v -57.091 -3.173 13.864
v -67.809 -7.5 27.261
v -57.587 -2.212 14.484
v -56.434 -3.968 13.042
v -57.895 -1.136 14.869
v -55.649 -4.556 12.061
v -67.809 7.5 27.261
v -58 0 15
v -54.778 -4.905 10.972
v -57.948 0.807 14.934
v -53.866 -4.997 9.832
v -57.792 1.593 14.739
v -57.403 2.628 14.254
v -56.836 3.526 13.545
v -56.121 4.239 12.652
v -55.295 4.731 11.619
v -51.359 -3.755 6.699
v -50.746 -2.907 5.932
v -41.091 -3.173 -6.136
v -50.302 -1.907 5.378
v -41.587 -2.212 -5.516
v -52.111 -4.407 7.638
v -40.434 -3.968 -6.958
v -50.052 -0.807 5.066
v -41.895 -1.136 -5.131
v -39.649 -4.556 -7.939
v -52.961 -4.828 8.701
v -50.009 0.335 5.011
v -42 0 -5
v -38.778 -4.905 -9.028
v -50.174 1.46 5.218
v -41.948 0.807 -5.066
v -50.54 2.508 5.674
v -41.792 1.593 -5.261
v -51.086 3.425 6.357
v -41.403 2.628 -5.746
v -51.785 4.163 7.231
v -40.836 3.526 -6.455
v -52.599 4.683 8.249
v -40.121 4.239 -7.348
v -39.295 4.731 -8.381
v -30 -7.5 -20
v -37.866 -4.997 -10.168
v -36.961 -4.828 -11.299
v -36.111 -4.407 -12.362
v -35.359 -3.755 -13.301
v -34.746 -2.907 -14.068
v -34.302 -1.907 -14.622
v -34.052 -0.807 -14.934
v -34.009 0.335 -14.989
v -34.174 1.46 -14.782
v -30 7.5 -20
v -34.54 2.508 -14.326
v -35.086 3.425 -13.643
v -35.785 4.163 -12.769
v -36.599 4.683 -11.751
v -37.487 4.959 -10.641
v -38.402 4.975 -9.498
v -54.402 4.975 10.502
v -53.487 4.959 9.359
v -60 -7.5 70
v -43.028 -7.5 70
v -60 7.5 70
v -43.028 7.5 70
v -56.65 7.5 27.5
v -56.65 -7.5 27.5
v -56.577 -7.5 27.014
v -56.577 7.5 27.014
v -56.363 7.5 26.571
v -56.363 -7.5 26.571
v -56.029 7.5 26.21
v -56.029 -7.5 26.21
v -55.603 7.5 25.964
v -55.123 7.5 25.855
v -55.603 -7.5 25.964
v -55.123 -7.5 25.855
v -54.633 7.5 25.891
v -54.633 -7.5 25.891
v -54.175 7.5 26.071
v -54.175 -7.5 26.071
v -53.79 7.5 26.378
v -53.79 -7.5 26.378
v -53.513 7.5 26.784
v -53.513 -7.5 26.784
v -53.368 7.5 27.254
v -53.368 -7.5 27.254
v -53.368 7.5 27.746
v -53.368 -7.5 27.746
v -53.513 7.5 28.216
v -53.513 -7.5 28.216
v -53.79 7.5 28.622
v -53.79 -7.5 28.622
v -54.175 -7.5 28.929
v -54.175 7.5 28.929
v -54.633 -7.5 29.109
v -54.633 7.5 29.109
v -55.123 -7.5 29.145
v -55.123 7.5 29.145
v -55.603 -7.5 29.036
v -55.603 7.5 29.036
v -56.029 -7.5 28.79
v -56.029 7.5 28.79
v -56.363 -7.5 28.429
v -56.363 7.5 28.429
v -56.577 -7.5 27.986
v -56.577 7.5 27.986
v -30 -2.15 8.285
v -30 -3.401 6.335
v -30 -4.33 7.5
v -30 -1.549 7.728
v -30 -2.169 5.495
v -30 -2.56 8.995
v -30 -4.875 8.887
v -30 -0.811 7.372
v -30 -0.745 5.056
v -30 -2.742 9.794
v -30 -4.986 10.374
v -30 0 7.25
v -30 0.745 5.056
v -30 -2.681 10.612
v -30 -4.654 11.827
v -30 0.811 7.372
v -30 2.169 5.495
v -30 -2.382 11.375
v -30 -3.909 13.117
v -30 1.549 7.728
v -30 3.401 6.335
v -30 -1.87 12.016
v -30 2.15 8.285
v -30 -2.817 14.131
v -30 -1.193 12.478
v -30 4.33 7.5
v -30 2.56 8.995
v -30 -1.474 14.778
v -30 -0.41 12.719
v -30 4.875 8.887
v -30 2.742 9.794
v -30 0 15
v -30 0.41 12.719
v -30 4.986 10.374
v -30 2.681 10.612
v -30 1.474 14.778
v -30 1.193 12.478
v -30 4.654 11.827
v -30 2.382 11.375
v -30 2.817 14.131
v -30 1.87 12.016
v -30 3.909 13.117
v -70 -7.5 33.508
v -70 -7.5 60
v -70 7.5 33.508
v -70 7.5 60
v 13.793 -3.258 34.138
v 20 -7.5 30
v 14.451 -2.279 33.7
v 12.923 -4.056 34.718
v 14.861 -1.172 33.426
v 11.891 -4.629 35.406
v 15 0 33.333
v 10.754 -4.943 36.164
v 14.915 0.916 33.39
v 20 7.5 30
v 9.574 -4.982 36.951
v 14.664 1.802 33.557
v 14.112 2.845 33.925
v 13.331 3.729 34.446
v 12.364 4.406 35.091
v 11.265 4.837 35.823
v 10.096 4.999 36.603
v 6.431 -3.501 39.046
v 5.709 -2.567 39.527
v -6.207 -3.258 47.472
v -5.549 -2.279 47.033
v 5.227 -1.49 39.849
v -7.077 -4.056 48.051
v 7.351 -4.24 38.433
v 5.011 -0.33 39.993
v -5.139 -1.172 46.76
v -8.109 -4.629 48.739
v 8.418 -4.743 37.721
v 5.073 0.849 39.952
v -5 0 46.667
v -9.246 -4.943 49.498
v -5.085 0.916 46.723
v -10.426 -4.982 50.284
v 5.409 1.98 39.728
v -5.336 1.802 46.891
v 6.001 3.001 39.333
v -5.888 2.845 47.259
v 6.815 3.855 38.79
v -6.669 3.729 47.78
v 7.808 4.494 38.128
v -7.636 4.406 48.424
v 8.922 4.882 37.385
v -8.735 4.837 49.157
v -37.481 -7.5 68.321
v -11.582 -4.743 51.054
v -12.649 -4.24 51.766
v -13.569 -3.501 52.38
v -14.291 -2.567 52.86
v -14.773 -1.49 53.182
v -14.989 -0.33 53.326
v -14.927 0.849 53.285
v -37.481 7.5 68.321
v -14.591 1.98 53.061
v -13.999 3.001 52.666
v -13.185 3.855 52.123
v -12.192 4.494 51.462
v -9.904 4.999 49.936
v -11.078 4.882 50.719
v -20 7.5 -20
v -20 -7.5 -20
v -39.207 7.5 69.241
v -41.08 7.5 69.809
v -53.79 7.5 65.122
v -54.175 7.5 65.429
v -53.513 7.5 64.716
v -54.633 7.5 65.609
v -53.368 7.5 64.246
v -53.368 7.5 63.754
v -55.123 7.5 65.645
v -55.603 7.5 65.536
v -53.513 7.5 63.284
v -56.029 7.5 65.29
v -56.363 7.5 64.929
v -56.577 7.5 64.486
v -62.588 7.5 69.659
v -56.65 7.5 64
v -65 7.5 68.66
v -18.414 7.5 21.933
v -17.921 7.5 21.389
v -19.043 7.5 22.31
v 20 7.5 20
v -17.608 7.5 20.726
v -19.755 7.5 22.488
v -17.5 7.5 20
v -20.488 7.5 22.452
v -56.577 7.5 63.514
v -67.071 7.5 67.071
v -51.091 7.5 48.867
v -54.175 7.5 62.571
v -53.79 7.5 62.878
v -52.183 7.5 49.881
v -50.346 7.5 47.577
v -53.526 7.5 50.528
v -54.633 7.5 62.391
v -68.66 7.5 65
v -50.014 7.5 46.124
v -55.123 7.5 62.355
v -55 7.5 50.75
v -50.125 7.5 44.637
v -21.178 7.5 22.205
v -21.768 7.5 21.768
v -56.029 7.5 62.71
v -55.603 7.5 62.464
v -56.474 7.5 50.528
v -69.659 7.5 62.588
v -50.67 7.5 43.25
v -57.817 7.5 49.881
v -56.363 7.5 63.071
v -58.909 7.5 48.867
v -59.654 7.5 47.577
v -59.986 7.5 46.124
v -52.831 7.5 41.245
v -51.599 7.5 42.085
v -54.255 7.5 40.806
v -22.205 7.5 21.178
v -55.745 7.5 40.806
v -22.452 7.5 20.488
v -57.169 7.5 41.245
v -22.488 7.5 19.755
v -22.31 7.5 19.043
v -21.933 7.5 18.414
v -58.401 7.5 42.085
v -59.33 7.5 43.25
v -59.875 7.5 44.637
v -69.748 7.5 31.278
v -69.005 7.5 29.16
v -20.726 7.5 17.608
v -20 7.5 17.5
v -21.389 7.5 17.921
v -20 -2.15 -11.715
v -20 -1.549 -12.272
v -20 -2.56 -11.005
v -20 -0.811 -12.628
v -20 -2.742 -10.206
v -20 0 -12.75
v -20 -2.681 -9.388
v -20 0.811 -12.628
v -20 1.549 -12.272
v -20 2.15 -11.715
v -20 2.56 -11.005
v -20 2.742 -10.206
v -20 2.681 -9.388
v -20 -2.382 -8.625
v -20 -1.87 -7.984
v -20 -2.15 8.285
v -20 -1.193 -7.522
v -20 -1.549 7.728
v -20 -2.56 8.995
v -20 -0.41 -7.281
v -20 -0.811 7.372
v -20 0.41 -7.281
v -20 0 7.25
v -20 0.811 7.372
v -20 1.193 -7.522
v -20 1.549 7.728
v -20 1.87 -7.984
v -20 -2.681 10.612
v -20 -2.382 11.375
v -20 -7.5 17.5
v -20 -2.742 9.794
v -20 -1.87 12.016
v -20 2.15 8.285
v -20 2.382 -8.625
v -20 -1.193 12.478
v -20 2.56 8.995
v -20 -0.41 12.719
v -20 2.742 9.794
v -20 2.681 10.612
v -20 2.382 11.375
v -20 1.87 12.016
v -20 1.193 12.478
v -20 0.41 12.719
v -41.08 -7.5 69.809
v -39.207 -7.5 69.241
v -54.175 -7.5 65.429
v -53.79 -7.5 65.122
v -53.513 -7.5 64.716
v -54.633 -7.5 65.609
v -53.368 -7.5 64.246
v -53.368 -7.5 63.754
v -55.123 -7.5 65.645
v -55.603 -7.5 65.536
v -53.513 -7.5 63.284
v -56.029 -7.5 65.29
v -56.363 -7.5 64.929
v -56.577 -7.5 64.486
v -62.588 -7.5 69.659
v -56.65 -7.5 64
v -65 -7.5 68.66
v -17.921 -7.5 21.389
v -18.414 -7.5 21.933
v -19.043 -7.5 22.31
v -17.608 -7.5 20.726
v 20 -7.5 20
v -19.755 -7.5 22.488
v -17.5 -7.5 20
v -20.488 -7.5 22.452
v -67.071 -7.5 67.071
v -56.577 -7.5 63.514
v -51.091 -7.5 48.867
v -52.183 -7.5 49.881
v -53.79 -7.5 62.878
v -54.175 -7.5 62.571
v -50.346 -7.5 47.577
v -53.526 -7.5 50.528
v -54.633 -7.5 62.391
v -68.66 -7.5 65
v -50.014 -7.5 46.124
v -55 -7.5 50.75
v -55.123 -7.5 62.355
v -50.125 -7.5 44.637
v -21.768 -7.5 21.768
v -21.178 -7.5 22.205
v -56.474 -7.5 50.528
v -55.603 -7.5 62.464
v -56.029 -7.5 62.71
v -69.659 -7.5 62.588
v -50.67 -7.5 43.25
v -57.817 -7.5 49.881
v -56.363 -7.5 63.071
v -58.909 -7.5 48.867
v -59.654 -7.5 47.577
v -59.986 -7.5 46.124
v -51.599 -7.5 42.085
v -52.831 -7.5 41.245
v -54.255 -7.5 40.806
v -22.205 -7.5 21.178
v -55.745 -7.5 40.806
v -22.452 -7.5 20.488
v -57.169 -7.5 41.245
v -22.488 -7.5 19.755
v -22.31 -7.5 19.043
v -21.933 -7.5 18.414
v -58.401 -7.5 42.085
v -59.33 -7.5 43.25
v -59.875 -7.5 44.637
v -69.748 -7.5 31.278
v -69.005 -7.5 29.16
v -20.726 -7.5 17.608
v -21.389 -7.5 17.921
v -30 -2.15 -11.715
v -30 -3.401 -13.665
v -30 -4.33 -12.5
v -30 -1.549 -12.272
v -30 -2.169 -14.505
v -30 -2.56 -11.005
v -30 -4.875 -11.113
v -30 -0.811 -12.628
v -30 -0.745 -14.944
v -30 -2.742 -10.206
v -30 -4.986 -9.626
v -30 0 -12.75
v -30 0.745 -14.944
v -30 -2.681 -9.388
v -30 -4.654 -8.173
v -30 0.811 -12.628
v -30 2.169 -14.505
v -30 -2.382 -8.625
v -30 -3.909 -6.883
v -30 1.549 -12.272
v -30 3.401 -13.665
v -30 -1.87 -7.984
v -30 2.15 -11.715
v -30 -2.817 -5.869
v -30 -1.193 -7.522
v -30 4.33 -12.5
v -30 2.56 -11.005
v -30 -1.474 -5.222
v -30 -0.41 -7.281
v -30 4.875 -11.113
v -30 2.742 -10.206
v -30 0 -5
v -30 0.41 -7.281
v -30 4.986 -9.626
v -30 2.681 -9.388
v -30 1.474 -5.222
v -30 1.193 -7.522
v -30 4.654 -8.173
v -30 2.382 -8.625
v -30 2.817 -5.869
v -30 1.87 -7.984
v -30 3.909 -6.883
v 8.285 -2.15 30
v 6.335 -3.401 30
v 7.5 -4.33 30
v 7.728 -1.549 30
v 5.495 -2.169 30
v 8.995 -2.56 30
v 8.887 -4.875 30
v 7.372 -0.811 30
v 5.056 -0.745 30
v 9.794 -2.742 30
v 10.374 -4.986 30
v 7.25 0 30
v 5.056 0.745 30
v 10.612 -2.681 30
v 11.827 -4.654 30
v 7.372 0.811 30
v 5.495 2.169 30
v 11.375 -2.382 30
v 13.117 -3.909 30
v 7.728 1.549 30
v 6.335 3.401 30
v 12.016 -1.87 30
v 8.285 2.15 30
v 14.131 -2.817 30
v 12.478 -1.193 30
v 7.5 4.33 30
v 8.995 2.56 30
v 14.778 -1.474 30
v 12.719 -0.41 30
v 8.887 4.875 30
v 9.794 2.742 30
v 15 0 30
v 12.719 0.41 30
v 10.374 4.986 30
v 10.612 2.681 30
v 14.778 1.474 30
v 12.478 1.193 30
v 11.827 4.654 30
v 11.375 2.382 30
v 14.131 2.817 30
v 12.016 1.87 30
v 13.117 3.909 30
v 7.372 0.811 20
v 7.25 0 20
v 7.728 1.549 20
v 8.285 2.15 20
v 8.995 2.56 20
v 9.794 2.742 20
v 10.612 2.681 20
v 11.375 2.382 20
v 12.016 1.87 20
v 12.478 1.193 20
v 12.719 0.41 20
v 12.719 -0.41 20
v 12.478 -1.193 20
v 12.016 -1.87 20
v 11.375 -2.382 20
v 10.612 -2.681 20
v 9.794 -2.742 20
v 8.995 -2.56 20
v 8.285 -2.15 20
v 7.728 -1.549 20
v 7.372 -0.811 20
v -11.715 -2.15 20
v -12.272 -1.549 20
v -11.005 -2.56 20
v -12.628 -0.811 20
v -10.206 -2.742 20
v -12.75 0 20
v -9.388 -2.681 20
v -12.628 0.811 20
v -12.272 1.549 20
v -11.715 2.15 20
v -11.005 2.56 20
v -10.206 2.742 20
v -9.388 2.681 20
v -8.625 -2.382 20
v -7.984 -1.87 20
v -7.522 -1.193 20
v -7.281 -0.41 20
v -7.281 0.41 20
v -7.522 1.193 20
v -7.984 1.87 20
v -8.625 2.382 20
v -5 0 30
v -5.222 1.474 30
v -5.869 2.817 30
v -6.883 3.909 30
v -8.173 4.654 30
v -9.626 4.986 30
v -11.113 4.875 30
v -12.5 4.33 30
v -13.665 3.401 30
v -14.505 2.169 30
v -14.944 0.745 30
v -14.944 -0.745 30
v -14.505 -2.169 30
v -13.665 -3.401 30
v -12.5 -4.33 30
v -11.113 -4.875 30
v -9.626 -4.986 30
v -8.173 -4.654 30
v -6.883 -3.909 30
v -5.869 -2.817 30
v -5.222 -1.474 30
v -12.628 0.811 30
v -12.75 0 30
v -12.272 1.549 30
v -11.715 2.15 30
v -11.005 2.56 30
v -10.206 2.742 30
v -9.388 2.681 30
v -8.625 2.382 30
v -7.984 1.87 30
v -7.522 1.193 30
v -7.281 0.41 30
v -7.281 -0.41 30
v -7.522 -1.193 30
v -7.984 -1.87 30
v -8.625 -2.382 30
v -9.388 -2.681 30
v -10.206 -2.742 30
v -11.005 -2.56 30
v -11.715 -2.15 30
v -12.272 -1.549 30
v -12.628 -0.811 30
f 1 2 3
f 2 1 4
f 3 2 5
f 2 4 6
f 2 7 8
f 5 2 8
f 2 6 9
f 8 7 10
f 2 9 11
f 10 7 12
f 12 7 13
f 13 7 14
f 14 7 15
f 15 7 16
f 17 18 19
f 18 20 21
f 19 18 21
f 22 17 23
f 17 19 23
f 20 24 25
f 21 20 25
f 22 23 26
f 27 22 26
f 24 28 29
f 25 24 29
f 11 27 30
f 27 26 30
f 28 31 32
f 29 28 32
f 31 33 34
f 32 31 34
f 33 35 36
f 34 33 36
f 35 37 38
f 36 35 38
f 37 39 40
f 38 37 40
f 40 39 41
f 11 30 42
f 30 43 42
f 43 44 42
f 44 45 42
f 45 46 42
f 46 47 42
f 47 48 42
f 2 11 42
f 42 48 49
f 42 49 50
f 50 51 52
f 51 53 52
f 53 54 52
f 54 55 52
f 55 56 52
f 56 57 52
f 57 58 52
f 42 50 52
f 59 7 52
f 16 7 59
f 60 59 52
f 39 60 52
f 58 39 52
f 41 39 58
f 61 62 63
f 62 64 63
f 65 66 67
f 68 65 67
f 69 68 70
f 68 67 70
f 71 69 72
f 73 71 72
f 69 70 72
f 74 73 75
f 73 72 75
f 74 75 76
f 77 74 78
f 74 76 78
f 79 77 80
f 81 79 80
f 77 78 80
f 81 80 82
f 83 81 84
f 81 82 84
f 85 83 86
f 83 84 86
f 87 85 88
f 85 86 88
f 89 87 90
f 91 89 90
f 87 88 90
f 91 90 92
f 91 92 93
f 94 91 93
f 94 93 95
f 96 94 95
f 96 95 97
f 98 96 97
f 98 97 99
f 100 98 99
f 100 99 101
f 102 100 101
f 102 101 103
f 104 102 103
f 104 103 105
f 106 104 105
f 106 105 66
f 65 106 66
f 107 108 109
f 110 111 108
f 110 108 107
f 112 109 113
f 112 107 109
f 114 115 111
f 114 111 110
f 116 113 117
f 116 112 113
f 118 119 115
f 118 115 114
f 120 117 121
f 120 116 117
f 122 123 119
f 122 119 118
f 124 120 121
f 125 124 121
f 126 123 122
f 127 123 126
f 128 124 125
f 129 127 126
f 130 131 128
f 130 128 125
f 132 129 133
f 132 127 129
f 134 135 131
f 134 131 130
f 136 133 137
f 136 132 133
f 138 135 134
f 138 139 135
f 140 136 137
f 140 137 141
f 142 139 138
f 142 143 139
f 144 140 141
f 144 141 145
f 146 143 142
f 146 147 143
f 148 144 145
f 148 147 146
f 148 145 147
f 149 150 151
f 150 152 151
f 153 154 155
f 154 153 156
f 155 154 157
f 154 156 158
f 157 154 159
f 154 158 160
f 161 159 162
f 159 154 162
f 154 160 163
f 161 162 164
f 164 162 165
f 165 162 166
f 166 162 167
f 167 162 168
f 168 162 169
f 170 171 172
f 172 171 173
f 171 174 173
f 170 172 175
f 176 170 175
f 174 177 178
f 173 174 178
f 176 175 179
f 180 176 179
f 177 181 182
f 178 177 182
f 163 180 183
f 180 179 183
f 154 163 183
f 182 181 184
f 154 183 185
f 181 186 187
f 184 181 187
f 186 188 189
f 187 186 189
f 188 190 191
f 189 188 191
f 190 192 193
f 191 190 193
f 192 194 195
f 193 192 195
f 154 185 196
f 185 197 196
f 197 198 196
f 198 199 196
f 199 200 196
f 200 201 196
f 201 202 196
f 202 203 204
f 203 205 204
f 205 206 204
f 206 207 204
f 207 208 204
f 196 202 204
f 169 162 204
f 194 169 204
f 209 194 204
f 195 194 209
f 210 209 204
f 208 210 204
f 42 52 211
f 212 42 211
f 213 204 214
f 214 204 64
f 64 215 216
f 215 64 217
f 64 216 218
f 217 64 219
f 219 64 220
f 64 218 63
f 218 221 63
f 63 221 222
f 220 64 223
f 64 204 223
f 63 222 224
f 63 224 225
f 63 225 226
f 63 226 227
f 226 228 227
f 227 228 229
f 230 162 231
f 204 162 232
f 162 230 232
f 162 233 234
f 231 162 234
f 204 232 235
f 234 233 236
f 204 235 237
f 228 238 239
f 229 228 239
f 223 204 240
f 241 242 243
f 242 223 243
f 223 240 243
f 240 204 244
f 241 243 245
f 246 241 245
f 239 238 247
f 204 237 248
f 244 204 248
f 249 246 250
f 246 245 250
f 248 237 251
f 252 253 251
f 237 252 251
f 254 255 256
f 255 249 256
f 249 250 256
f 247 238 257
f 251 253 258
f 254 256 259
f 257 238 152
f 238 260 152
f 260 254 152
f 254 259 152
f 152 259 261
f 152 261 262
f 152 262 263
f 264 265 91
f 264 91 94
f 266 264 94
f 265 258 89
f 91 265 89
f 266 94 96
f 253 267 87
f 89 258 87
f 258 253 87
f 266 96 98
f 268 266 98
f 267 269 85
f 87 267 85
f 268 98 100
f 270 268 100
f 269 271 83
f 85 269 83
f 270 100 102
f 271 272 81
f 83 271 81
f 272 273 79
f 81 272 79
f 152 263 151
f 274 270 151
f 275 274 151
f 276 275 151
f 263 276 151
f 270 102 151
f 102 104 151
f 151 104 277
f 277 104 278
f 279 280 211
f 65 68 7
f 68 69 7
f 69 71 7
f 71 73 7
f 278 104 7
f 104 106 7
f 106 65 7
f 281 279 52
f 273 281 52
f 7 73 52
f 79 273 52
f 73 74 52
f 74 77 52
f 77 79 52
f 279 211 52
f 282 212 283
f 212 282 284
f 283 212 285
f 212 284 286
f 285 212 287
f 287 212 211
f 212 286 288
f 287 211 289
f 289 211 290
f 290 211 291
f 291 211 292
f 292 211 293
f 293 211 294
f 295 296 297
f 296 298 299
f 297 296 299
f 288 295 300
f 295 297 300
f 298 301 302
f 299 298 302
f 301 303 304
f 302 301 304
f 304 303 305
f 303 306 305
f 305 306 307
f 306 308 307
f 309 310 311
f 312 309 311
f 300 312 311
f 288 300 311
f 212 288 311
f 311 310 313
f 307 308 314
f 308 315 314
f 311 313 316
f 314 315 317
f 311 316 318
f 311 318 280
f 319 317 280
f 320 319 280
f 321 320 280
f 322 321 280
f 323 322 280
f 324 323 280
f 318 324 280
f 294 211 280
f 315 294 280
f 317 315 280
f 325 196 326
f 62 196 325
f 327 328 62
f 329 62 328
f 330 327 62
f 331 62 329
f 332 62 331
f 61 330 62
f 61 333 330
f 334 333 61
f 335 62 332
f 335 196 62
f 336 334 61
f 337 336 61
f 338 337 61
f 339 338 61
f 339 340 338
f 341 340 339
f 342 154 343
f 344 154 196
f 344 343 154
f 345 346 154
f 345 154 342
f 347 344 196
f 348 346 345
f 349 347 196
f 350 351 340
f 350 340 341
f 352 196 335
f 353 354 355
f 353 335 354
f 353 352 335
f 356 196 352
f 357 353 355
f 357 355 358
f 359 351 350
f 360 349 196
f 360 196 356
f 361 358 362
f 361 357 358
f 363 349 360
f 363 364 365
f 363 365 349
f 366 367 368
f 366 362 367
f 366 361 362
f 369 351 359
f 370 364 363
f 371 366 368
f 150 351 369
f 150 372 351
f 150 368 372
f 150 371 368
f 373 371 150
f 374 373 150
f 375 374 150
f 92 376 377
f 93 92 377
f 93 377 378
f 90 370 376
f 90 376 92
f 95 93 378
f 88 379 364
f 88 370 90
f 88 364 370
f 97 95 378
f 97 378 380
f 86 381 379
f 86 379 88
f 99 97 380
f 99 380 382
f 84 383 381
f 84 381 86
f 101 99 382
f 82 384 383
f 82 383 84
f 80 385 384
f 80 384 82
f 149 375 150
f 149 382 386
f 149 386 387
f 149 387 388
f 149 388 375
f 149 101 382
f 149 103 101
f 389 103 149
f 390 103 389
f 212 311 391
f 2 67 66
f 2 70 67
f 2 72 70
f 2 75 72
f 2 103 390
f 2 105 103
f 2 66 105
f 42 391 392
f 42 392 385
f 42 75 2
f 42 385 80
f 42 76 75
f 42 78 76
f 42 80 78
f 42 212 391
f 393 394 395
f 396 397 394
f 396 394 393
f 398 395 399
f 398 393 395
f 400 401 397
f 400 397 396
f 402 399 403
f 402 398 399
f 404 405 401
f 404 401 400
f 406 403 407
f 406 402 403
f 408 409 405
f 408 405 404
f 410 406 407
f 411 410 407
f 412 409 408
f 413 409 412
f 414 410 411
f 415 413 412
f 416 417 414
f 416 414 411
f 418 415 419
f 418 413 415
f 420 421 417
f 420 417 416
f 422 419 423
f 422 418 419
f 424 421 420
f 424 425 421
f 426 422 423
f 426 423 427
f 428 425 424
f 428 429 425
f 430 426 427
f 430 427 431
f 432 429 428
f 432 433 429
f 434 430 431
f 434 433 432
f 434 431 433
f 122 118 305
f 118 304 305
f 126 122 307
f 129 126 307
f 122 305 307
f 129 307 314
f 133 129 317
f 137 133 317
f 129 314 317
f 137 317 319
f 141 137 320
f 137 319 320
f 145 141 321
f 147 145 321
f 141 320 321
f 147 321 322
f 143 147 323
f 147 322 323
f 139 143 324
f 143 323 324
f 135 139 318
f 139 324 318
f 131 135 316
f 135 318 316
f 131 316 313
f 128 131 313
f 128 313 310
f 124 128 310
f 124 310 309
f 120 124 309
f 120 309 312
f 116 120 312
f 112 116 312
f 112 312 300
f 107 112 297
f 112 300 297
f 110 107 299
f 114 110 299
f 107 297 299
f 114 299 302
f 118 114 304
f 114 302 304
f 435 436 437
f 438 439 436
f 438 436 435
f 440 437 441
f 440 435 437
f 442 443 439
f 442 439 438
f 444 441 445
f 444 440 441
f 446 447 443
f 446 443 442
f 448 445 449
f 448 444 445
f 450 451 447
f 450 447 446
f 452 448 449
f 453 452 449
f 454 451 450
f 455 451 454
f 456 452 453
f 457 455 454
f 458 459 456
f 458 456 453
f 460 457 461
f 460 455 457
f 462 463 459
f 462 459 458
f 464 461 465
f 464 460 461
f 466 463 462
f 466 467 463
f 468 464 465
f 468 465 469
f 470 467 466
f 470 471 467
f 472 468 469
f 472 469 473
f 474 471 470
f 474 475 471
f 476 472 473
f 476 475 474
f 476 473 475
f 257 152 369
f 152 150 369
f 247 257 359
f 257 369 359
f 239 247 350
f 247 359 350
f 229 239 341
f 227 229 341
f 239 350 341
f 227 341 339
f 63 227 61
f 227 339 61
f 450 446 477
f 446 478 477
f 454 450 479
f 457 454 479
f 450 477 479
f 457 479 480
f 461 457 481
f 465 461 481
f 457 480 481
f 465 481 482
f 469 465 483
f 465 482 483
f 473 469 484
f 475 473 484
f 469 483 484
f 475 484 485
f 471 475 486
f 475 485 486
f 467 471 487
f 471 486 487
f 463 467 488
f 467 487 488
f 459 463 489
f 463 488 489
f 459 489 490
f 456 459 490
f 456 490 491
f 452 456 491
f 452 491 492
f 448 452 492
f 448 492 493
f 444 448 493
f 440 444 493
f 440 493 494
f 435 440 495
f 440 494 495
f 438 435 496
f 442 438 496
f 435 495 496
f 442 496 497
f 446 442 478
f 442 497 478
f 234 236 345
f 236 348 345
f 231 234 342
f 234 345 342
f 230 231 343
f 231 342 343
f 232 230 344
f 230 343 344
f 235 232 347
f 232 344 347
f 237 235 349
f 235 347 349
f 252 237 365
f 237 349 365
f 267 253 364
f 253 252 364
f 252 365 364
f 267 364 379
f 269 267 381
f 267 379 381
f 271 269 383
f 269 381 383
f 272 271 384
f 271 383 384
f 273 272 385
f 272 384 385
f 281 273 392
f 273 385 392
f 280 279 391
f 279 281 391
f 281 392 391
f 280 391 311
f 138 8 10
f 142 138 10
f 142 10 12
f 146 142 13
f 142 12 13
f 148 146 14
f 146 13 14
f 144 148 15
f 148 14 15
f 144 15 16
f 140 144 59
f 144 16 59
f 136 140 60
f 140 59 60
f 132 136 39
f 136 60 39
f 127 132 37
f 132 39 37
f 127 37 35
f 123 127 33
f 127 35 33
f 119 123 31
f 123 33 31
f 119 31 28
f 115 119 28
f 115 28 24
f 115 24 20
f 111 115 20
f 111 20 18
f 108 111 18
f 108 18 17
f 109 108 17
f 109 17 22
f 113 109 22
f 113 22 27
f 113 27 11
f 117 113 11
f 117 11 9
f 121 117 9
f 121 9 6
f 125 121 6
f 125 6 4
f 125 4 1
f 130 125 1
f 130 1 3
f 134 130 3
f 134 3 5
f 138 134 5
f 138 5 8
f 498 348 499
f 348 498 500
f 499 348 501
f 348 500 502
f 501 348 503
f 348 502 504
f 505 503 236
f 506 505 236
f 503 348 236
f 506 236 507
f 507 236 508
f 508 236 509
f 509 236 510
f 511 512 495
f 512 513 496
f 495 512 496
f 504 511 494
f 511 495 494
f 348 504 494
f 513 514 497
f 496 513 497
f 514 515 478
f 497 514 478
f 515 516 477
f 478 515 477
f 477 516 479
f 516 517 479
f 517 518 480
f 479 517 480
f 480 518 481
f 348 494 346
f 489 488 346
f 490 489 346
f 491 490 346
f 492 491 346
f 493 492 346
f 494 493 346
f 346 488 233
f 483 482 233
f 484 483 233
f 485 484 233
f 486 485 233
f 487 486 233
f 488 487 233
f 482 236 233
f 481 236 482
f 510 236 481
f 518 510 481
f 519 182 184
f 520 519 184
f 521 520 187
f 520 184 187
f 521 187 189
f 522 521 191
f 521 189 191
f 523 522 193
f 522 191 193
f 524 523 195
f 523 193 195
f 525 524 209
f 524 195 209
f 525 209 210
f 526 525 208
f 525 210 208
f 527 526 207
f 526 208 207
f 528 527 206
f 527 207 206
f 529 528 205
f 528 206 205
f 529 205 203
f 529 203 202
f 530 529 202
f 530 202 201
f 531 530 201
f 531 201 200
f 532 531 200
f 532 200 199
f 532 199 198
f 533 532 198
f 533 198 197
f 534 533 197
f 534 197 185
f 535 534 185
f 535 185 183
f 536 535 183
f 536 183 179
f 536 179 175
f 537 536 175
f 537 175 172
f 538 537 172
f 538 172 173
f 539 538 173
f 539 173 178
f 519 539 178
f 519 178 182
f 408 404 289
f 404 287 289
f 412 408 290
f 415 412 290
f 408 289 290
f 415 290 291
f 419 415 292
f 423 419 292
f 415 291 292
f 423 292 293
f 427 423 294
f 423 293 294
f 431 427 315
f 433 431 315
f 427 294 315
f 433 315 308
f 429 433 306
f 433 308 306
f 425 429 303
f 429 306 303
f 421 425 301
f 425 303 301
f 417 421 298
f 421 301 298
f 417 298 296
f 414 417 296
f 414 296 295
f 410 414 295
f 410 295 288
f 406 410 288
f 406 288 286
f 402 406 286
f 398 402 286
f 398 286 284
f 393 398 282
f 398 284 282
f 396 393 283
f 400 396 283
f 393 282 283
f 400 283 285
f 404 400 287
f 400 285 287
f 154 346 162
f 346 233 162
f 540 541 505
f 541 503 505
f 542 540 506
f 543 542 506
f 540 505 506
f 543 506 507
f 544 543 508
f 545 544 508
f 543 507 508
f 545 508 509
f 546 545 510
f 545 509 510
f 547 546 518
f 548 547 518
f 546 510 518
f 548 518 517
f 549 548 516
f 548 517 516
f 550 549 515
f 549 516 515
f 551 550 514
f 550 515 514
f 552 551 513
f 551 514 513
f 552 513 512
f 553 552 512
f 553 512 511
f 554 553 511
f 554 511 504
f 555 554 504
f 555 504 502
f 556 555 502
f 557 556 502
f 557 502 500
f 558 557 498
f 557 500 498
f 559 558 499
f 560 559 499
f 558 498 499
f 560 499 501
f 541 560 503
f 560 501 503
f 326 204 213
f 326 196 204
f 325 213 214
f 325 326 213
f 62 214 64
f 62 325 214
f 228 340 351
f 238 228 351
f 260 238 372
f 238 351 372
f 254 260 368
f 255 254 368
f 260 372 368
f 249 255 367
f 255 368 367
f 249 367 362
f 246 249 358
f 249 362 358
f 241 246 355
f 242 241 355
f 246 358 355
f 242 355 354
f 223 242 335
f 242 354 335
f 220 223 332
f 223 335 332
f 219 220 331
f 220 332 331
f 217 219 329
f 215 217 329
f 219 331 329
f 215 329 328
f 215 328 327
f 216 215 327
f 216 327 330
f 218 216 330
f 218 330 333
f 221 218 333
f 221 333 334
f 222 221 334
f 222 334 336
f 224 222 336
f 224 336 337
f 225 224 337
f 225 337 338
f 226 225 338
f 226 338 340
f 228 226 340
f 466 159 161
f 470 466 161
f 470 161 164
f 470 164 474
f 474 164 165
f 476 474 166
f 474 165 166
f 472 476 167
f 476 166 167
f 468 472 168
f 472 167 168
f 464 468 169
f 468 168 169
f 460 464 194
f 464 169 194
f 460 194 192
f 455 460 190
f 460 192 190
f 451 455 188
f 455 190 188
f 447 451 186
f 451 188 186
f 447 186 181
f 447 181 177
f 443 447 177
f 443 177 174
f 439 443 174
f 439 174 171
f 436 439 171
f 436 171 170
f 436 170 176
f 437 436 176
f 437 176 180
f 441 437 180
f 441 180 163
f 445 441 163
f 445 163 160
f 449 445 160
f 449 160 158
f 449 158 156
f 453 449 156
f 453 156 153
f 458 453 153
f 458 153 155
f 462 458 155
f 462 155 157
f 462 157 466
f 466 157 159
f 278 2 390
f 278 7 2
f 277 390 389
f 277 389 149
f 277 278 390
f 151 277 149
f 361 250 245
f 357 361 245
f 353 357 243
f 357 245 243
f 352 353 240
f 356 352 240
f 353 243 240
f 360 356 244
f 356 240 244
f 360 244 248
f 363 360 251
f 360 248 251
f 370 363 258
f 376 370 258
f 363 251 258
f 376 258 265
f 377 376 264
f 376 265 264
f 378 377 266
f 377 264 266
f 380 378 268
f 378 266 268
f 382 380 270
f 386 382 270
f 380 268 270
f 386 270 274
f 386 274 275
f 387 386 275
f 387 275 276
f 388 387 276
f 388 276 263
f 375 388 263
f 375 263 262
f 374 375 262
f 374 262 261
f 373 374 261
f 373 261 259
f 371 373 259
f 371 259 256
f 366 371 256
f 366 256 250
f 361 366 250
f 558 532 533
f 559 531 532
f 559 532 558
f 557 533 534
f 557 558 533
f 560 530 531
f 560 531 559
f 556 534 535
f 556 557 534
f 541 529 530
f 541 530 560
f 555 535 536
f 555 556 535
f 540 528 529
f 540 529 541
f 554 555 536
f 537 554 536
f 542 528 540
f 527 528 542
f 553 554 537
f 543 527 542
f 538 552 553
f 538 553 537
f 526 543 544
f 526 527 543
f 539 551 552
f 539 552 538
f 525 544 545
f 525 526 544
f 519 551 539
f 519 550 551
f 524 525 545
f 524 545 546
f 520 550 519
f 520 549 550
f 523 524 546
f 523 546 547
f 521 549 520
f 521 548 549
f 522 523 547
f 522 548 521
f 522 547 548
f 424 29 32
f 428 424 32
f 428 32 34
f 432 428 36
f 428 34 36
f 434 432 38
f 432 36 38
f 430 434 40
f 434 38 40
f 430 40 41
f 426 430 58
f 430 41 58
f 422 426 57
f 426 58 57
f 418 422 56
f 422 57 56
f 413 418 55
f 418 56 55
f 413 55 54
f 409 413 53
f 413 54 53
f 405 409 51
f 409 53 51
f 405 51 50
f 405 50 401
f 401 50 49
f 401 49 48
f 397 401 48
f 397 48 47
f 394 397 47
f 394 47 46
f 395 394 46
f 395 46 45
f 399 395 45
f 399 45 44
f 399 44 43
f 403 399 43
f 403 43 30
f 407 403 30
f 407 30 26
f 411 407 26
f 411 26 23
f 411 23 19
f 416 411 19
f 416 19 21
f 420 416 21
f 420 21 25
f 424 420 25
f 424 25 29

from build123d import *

# Parameters (mm, degrees)
BOSS_EXTRUDE1_DEPTH                                 = 7.5
M4_TAPPED_HOLE1_D                                   = 3.3
SKETCH14_R                                          = 5
CUT_EXTRUDE4_DEPTH                                  = 101.124921973
FILLET1_R                                           = 10
CBORE_FOR_M5_HEX_SOCKET_HEAD_CAP_SCREW1_D           = 5.5
CBORE_FOR_M5_HEX_SOCKET_HEAD_CAP_SCREW1_CBORE_D     = 10
CBORE_FOR_M5_HEX_SOCKET_HEAD_CAP_SCREW1_CBORE_DEPTH = 40
CBORE_FOR_M5_HEX_SOCKET_HEAD_CAP_SCREW2_D           = 5.5
CBORE_FOR_M5_HEX_SOCKET_HEAD_CAP_SCREW2_CBORE_D     = 10
CBORE_FOR_M5_HEX_SOCKET_HEAD_CAP_SCREW2_CBORE_DEPTH = 40
F_5_0_5_DIAMETER_HOLE1_D                            = 5


with BuildPart() as part:
    # Sketch1 → Boss-Extrude1 (new, symmetric)
    with BuildSketch(Plane(origin=(0, 0, 0), x_dir=(1, 0, 0), z_dir=(0, 1, 0))):
        Polygon((-20, 20), (-20, -20), (20, -20), (20, -30), (-40, -70), (-70, -70), (-70, -30), (-30, 20), align=None)
    extrude(amount=BOSS_EXTRUDE1_DEPTH, both=True)

    # M4 Tapped Hole1 (through all)
    with Locations(Plane(origin=(0, 7.5, 0), x_dir=(1, 0, 0), z_dir=(0, 1, 0))):
        with Locations((-55, -27.5), (-55, -64)):
            Hole(M4_TAPPED_HOLE1_D / 2)

    # Sketch14 → Cut-Extrude4 (cut, through all)
    with BuildSketch(Plane(origin=(0, 7.5, 0), x_dir=(1, 0, 0), z_dir=(0, 1, 0))):
        with Locations((-55, -45.75)):
            Circle(SKETCH14_R)
    extrude(amount=-CUT_EXTRUDE4_DEPTH, mode=Mode.SUBTRACT)

    # Fillet1
    fillet1_edges = [part.edges().sort_by_distance(p)[0] for p in [
        (-40, 0, 70),
        (-70, 0, 70),
        (-70, 0, 30),
    ]]
    fillet(fillet1_edges, radius=FILLET1_R)

    # CBORE for M5 Hex Socket Head Cap Screw1 (through all)
    with Locations(Plane.XY.offset(70)):
        with Locations((10, 0), (-10, 0)):
            CounterBoreHole(CBORE_FOR_M5_HEX_SOCKET_HEAD_CAP_SCREW1_D / 2, CBORE_FOR_M5_HEX_SOCKET_HEAD_CAP_SCREW1_CBORE_D / 2, CBORE_FOR_M5_HEX_SOCKET_HEAD_CAP_SCREW1_CBORE_DEPTH)

    # CBORE for M5 Hex Socket Head Cap Screw2 (through all)
    with Locations(Plane.ZY.offset(70)):
        with Locations((10, 0), (-10, 0)):
            CounterBoreHole(CBORE_FOR_M5_HEX_SOCKET_HEAD_CAP_SCREW2_D / 2, CBORE_FOR_M5_HEX_SOCKET_HEAD_CAP_SCREW2_CBORE_D / 2, CBORE_FOR_M5_HEX_SOCKET_HEAD_CAP_SCREW2_CBORE_DEPTH)

    # Ø5.0 (5) Diameter Hole1 (through all)
    with Locations(Plane(origin=(0, 7.5, 0), x_dir=(1, 0, 0), z_dir=(0, 1, 0))):
        with Locations((-20, -20)):
            Hole(F_5_0_5_DIAMETER_HOLE1_D / 2)


solid = part.part
